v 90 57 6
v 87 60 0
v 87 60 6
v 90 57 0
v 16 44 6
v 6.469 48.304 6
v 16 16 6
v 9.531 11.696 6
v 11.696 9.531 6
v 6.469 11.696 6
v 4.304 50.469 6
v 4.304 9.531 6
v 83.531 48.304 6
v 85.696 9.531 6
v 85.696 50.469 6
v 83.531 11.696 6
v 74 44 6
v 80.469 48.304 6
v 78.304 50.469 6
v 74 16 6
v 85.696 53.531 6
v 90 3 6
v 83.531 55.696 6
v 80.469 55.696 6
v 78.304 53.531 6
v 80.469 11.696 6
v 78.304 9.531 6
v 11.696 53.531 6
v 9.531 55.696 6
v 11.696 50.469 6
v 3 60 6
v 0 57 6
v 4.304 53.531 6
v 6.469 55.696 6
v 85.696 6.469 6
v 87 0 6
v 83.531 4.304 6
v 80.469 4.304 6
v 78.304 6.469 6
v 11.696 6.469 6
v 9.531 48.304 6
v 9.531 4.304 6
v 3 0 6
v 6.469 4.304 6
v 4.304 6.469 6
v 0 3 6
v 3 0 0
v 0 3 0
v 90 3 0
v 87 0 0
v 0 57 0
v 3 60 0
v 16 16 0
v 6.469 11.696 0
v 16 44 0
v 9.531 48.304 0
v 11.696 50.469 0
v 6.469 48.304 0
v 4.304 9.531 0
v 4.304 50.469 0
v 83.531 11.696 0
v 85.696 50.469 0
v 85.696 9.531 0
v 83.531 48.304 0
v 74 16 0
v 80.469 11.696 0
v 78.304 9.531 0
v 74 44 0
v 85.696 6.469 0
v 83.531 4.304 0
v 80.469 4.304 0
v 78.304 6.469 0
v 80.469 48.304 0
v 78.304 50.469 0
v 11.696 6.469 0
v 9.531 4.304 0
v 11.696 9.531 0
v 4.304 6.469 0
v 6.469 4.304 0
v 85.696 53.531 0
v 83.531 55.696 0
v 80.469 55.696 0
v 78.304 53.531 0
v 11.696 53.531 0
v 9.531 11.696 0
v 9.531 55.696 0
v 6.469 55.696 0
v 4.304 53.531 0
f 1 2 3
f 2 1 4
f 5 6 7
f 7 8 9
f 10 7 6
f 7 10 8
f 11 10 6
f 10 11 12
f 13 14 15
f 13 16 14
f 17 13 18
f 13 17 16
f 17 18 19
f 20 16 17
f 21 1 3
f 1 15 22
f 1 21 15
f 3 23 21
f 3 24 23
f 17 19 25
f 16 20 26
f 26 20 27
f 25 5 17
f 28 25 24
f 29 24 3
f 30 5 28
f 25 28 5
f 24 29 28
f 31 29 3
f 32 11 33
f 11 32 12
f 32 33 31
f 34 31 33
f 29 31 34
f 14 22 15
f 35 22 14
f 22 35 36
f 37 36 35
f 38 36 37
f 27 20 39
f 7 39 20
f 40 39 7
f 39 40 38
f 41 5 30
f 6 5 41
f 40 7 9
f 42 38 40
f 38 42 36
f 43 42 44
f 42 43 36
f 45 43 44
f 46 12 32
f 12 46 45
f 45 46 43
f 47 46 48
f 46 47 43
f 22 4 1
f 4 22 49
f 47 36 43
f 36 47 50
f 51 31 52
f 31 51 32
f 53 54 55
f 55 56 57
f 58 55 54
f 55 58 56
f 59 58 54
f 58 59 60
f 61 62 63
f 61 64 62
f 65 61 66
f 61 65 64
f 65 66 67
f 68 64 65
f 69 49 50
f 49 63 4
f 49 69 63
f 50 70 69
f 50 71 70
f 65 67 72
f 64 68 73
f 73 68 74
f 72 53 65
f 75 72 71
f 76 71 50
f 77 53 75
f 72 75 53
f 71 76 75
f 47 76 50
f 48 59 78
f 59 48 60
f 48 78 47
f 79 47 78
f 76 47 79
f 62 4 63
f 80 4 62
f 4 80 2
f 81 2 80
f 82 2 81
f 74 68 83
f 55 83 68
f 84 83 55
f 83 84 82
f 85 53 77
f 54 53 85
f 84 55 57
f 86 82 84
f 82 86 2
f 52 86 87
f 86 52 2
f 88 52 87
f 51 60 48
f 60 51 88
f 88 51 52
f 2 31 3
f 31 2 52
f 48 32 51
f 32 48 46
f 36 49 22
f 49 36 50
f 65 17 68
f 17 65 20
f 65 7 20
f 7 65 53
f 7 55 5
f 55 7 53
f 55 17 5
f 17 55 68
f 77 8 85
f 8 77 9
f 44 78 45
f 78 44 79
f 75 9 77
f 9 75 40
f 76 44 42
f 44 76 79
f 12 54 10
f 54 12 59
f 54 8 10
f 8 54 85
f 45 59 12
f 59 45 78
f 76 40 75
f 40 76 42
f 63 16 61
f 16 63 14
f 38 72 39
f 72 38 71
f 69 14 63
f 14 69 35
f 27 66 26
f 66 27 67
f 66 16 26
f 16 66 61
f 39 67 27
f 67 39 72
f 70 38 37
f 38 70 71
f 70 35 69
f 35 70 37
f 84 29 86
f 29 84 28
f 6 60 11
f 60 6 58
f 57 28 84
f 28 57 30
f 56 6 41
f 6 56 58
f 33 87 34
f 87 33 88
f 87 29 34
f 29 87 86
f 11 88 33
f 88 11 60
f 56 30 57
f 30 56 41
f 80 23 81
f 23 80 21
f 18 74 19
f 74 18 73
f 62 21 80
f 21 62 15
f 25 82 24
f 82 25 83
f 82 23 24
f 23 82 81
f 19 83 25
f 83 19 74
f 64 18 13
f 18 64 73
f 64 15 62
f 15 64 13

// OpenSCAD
$fn = 32;

// ----------------------------------------------------------------------
// Frame plate: 90 x 60 frame, 16 mm rails
// ----------------------------------------------------------------------

// --- parameters (mm) ---
plate_l = 90;             // plate length, X
plate_w = 60;             // plate width, Y
plate_t = 6;              // plate thickness, Z (extrusion height)
corner_c = 3;             // corner chamfer
frame_bar = 16;           // frame rail width
bolt_r = 4;               // corner bolt window radius
bolt_inset = 8;           // bolt centre inset from the edges

win_l = plate_l - 2 * frame_bar;  // window length
win_w = plate_w - 2 * frame_bar;  // window width
bolt_d = 2 * bolt_r;  // corner hole diameter

profile = [[3, 0], [87, 0], [90, 3], [90, 57], [87, 60], [3, 60], [0, 57], [0, 3]];  // primary outline, 8 points, counter clockwise
void_1 = [[16, 16], [74, 16], [74, 44], [16, 44]];  // the window, 4 points
void_2 = [[11.696, 9.531], [9.531, 11.696], [6.469, 11.696], [4.304, 9.531], [4.304, 6.469], [6.469, 4.304], [9.531, 4.304], [11.696, 6.469]];  // corner bolt window, 8 points
void_3 = [[85.696, 9.531], [83.531, 11.696], [80.469, 11.696], [78.304, 9.531], [78.304, 6.469], [80.469, 4.304], [83.531, 4.304], [85.696, 6.469]];  // corner bolt window, 8 points
void_4 = [[11.696, 53.531], [9.531, 55.696], [6.469, 55.696], [4.304, 53.531], [4.304, 50.469], [6.469, 48.304], [9.531, 48.304], [11.696, 50.469]];  // corner bolt window, 8 points
void_5 = [[85.696, 53.531], [83.531, 55.696], [80.469, 55.696], [78.304, 53.531], [78.304, 50.469], [80.469, 48.304], [83.531, 48.304], [85.696, 50.469]];  // corner bolt window, 8 points

// --- the one profile operation ---
difference() {
  linear_extrude(height = plate_t) polygon(points = profile);
  translate([0, 0, -1])
    linear_extrude(height = plate_t + 2) polygon(points = void_1);
  translate([0, 0, -1])
    linear_extrude(height = plate_t + 2) polygon(points = void_2);
  translate([0, 0, -1])
    linear_extrude(height = plate_t + 2) polygon(points = void_3);
  translate([0, 0, -1])
    linear_extrude(height = plate_t + 2) polygon(points = void_4);
  translate([0, 0, -1])
    linear_extrude(height = plate_t + 2) polygon(points = void_5);
}
